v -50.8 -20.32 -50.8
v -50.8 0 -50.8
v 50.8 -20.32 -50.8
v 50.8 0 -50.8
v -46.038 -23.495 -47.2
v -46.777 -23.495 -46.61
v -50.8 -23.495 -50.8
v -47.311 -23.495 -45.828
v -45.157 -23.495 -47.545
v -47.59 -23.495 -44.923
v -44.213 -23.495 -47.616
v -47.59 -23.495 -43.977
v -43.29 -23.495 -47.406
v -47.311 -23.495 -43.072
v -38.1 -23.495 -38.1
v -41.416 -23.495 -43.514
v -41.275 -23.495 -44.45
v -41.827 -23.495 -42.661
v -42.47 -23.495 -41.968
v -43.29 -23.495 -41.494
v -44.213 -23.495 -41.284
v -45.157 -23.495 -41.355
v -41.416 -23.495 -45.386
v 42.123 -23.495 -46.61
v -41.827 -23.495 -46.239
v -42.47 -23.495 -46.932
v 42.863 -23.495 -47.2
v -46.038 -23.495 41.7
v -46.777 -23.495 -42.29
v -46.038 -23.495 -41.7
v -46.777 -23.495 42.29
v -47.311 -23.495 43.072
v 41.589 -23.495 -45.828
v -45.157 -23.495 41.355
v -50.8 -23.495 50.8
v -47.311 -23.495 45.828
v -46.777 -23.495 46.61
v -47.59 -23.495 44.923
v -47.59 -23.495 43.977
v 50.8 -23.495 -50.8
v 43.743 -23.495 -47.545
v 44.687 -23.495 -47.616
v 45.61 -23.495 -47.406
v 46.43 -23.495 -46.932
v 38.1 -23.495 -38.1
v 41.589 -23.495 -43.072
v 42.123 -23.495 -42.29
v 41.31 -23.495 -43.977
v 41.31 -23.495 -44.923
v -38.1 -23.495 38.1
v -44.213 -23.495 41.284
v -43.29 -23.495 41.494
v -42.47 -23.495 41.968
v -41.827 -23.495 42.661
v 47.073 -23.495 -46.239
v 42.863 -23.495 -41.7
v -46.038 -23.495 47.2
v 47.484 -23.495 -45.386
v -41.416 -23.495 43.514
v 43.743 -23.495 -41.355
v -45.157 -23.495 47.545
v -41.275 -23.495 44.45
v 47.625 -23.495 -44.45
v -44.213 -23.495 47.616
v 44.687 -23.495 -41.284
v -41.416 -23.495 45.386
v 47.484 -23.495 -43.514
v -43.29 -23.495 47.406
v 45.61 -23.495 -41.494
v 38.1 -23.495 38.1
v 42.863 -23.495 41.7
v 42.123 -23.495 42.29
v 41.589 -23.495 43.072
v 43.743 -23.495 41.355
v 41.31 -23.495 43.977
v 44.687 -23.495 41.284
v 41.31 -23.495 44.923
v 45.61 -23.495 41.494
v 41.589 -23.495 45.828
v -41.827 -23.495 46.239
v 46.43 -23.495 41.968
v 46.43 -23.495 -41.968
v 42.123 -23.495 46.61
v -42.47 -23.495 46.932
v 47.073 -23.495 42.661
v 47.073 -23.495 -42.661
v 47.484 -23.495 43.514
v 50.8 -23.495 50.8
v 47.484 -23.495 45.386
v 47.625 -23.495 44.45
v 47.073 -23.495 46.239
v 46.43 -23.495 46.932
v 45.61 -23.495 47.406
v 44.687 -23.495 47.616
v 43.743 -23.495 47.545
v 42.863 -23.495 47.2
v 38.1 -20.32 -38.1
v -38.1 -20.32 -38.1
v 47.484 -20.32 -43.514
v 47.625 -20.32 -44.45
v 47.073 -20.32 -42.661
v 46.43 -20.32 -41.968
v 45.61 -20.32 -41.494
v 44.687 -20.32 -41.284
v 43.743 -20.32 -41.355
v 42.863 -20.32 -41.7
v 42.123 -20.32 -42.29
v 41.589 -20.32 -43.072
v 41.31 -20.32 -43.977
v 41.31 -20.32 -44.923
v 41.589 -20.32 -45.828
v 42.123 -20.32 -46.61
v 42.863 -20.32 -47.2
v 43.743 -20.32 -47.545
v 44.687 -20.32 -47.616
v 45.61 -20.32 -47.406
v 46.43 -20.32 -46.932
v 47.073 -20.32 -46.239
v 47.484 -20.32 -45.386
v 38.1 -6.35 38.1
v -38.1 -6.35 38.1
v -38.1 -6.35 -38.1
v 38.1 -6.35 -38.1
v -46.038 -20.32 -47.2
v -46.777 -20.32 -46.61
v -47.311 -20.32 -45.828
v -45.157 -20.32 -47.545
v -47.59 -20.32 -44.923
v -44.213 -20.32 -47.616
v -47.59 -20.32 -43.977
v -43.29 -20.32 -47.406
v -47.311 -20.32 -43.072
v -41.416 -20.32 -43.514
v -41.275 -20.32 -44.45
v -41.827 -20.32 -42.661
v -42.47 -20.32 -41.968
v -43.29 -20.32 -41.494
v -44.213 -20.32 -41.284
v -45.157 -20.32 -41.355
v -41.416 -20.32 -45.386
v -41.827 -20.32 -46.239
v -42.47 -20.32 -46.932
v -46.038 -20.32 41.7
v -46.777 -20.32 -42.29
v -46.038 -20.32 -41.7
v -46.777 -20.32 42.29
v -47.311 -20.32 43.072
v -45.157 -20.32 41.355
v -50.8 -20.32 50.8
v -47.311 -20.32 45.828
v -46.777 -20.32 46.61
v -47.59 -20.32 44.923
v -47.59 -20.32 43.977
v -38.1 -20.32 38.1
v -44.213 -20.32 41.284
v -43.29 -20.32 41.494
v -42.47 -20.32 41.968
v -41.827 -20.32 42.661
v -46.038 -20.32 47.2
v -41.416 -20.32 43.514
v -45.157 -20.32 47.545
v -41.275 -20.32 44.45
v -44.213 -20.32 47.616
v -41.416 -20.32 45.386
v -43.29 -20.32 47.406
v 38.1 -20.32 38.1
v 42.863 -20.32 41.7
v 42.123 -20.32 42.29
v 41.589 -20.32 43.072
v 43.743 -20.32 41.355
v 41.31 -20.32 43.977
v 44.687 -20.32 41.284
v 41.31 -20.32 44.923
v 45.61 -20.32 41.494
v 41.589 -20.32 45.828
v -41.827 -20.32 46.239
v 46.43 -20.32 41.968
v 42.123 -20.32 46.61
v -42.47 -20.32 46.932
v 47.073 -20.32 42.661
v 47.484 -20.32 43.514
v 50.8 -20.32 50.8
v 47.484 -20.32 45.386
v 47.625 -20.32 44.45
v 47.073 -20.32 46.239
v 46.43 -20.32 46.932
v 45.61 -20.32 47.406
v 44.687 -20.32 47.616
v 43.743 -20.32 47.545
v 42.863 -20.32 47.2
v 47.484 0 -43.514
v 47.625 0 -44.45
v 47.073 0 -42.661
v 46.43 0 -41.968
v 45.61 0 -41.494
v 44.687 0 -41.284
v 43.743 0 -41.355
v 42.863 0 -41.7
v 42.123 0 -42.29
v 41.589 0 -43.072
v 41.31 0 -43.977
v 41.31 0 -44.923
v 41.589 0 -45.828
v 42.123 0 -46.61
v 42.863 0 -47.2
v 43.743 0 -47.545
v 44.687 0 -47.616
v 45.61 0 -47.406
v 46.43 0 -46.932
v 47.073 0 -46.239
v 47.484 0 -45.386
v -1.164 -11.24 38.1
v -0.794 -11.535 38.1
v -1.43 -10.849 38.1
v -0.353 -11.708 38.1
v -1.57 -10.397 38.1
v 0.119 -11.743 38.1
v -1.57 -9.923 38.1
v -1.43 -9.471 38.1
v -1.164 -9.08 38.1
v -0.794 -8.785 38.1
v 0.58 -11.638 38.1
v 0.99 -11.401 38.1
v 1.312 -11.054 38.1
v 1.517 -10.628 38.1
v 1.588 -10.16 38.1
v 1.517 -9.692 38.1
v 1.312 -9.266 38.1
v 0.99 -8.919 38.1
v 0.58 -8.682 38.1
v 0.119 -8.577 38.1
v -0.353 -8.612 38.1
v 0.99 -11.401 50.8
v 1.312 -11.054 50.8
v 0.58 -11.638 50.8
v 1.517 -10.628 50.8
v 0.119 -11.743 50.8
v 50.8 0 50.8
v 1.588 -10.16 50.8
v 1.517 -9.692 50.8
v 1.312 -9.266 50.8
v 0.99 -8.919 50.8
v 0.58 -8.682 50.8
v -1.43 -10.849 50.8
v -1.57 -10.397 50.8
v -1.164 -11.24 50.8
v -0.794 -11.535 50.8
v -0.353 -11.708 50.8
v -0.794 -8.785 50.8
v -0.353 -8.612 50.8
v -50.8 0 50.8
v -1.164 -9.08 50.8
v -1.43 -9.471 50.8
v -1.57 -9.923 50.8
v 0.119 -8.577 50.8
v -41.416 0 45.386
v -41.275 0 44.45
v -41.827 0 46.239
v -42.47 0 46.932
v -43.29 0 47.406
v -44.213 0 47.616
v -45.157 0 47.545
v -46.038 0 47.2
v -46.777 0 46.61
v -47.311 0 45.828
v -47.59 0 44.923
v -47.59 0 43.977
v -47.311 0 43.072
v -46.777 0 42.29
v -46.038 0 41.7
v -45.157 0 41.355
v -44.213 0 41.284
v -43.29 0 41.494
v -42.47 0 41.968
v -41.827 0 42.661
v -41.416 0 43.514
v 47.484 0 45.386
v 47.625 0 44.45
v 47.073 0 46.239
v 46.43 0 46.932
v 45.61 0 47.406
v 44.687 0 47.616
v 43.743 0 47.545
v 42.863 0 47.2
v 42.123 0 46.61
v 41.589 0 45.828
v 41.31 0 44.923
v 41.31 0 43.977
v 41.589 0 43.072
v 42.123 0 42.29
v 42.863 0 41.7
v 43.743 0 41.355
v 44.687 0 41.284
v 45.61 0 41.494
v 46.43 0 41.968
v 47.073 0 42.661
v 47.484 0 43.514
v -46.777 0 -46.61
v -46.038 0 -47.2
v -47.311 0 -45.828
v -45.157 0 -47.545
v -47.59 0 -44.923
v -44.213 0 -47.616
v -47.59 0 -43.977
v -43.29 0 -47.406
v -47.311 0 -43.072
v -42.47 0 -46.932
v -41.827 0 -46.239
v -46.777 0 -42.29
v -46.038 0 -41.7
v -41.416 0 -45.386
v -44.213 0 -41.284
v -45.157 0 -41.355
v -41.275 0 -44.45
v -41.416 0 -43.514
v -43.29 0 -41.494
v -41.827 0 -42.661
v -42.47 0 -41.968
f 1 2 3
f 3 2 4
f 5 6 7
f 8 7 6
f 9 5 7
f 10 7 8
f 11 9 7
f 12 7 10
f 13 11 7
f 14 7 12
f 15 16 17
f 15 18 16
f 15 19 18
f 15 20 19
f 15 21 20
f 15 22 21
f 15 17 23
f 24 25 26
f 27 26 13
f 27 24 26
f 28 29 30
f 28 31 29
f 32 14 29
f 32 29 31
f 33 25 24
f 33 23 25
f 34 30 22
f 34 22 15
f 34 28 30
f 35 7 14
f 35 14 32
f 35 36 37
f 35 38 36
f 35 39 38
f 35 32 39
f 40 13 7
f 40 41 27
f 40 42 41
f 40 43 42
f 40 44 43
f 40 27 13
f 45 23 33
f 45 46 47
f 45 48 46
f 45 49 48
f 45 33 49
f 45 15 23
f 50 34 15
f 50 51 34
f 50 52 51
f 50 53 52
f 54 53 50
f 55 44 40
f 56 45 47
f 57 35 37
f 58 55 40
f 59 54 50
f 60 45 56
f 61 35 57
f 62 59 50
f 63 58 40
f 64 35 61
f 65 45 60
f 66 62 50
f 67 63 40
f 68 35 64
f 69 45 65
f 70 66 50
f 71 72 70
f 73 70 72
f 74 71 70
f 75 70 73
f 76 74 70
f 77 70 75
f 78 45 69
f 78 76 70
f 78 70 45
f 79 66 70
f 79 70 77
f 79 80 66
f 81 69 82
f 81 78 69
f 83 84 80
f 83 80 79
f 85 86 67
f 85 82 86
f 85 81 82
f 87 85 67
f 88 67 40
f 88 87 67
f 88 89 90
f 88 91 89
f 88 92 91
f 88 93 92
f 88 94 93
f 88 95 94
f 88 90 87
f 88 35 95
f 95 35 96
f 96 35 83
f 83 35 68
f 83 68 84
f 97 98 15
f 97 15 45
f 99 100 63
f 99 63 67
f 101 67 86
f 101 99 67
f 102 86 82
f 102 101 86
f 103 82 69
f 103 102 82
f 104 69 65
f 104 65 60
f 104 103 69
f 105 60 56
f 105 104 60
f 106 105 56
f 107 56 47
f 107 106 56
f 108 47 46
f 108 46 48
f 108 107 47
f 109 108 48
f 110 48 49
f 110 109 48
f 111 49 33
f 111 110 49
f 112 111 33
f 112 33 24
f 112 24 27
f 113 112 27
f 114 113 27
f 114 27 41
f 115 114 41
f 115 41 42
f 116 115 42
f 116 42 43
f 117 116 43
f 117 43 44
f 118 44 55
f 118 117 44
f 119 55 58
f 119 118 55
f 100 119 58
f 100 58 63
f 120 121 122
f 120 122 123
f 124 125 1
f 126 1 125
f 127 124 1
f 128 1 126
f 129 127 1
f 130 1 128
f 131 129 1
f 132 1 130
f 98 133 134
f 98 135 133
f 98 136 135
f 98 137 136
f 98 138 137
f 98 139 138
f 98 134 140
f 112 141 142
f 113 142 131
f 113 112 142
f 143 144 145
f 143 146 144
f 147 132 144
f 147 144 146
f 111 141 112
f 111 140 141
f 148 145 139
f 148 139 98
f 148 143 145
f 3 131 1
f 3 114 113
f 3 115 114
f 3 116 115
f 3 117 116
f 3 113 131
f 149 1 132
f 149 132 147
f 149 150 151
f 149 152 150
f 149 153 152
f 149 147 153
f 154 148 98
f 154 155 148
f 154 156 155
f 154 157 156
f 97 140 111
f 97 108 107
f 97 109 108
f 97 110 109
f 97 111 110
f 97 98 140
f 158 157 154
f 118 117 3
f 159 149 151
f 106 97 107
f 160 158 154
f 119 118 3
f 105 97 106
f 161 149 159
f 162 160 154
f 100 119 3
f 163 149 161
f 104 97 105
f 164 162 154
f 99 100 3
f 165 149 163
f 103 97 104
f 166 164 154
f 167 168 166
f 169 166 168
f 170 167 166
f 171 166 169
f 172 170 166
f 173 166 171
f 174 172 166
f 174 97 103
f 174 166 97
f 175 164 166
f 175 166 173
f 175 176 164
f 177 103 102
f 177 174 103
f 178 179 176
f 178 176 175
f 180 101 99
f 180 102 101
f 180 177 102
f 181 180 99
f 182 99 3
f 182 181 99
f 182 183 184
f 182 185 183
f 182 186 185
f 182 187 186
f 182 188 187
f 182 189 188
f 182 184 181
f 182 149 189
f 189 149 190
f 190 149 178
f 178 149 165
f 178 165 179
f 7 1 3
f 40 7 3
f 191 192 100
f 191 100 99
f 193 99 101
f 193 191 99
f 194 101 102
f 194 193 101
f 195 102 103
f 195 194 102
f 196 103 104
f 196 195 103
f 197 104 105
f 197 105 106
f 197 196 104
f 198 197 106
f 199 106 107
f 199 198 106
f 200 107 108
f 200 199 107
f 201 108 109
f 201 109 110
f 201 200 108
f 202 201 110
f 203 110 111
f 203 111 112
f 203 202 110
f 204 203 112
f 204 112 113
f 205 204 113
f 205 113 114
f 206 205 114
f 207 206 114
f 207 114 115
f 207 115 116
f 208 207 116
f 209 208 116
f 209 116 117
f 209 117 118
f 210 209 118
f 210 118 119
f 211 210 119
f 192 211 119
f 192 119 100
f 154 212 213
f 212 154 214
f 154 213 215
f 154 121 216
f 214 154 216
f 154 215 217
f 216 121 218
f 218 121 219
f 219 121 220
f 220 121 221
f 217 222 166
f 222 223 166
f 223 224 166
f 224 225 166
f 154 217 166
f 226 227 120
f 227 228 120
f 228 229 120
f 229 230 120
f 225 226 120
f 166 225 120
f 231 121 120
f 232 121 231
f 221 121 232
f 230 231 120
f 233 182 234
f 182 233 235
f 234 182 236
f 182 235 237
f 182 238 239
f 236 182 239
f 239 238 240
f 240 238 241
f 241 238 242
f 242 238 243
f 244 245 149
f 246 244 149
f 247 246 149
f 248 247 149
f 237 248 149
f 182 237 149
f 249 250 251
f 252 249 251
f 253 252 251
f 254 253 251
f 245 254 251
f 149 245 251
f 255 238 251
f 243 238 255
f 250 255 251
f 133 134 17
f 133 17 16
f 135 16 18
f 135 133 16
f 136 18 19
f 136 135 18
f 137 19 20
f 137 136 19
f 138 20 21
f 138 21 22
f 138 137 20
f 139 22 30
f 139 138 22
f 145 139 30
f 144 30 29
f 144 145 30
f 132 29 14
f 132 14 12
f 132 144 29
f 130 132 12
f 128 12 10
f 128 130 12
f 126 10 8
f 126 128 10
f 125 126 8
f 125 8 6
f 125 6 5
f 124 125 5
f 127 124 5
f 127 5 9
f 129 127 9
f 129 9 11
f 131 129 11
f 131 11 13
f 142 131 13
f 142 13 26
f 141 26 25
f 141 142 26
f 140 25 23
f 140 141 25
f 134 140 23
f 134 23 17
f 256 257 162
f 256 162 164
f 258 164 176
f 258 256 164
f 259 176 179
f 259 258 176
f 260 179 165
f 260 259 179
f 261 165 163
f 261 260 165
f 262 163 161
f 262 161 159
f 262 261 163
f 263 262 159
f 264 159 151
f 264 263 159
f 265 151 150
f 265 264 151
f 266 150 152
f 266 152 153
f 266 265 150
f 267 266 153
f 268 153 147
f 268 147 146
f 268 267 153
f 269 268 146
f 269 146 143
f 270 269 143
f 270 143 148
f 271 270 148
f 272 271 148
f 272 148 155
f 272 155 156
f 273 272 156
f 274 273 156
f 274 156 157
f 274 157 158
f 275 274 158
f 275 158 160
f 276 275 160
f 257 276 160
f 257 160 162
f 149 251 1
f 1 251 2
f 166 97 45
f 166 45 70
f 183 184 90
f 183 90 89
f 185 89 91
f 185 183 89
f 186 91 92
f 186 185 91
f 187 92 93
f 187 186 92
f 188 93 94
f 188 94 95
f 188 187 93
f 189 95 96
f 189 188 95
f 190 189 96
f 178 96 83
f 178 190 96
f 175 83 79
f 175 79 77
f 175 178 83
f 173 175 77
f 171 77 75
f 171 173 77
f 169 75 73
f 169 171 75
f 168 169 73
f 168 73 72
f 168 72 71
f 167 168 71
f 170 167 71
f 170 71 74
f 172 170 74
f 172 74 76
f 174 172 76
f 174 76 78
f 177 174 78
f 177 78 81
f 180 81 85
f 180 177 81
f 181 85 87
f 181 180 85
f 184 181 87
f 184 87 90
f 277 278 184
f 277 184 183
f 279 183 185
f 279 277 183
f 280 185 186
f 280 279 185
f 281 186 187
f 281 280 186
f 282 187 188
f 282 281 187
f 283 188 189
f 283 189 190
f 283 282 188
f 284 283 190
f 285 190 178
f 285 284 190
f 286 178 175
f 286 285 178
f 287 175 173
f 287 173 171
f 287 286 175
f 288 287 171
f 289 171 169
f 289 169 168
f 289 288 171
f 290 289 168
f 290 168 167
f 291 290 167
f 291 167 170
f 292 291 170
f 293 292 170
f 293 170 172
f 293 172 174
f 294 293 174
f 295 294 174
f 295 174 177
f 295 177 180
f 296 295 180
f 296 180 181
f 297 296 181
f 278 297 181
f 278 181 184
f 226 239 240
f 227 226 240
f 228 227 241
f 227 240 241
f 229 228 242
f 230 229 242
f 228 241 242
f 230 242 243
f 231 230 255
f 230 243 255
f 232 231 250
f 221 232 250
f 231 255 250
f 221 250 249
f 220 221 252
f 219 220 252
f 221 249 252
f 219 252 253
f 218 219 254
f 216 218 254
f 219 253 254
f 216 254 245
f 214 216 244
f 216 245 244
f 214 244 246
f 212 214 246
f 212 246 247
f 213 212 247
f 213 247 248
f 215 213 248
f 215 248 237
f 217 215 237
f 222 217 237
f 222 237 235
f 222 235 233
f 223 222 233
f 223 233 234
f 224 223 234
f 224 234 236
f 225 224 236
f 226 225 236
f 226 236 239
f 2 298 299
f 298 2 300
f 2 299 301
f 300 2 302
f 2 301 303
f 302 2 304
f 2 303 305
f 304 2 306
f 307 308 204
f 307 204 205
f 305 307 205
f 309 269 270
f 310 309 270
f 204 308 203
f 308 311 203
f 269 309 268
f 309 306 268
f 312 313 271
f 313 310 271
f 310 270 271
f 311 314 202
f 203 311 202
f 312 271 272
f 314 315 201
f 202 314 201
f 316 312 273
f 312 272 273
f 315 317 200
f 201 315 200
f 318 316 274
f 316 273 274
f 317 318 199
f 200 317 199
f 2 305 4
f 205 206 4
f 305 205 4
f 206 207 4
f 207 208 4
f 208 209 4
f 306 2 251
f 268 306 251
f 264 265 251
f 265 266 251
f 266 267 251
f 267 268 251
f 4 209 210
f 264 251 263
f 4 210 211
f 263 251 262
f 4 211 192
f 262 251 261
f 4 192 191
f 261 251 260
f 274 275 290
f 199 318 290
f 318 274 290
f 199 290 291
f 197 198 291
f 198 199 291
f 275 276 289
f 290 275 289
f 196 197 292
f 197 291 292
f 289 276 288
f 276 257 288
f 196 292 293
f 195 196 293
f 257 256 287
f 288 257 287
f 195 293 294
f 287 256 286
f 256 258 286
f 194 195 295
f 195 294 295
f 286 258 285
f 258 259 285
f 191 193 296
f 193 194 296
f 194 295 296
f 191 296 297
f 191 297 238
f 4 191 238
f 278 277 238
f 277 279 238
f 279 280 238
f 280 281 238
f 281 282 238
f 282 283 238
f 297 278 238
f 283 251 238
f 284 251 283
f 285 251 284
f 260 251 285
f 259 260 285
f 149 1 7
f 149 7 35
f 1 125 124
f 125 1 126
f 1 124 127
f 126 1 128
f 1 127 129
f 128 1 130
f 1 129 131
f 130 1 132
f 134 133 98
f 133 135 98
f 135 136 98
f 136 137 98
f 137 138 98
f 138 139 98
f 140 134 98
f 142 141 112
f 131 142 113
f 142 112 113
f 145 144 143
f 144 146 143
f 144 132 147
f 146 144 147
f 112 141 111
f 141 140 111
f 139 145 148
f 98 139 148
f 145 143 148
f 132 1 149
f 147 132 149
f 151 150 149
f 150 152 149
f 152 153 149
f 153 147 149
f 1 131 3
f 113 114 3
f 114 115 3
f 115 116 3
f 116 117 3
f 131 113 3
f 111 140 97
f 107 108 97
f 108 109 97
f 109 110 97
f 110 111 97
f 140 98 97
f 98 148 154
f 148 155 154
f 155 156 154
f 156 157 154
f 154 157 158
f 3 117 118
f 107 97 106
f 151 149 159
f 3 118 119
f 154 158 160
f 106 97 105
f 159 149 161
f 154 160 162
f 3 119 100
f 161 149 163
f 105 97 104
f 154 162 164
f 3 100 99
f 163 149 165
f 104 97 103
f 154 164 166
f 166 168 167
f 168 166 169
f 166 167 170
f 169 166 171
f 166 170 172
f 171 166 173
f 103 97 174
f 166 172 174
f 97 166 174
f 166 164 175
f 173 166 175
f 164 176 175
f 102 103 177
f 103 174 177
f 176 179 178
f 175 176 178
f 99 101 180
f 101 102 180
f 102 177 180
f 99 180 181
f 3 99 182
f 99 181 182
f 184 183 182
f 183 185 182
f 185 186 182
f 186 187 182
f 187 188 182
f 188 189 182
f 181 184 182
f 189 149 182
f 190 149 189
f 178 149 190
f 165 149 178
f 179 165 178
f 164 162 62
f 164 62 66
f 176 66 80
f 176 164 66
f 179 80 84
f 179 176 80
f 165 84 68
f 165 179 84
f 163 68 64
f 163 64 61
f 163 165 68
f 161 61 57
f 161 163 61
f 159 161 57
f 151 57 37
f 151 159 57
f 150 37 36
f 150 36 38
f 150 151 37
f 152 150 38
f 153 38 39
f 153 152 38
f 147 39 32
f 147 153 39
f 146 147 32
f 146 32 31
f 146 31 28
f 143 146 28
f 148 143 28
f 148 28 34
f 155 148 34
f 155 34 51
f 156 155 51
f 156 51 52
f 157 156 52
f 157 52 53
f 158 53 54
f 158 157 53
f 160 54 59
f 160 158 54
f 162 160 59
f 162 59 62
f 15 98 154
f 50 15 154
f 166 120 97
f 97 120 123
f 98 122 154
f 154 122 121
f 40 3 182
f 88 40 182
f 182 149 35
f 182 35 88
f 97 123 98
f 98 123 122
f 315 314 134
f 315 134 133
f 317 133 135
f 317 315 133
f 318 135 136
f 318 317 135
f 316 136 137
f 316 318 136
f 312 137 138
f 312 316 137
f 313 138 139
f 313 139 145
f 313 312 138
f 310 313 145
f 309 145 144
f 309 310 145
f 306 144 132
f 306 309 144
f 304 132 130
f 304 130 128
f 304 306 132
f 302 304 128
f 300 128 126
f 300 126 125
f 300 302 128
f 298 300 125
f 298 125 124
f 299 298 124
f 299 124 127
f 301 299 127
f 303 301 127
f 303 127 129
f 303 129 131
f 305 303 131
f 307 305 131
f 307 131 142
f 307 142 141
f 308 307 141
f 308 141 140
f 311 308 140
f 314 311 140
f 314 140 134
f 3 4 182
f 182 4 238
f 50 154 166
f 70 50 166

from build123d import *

# Parameters (mm, degrees)
F0_R     = 3.175
F0_W     = 12.7
F0_H     = 12.7
F1_DEPTH = 6.35
F2_DEPTH = 20.32
F3_R     = 1.5875
F4_DEPTH = 25.4
F5_W     = 101.6
F5_H     = 101.6
F5_R     = 3.175
F5_W_2   = 76.2
F5_H_2   = 76.2
F6_DEPTH = 3.175


# Not quite as in the source:
# - a feature names something its author has since deleted; it is built from what else it names


with BuildPart() as f1:
    # F0 (on Front) → F1 (new body)
    with BuildSketch(Plane.XZ):
        Polygon((38.1, 38.1), (38.1, 0), (38.1, -38.1), (-38.1, -38.1), (-38.1, 0), (-38.1, 38.1), (-50.8, 38.1), (-50.8, -50.8), (50.8, -50.8), (50.8, 38.1), align=None)
        with Locations((-44.45, -44.45)):
            Circle(F0_R, mode=Mode.SUBTRACT)
        with Locations((44.45, -44.45)):
            Circle(F0_R, mode=Mode.SUBTRACT)
        Polygon((38.1, -38.1), (38.1, 0), (38.1, 38.1), (0, 38.1), (-38.1, 38.1), (-38.1, 0), (-38.1, -38.1), align=None)
        Polygon((0, 38.1), (38.1, 38.1), (38.1, 50.8), (-38.1, 50.8), (-38.1, 38.1), align=None)
        with Locations((-44.45, 44.45)):
            Rectangle(F0_W, F0_H)
        with Locations((-44.45, 44.45)):
            Circle(F0_R, mode=Mode.SUBTRACT)
        with Locations((44.45, 44.45)):
            Rectangle(F0_W, F0_H)
        with Locations((44.45, 44.45)):
            Circle(F0_R, mode=Mode.SUBTRACT)
    extrude(amount=F1_DEPTH)

    # F0 (on Front) → F2 (join)
    with BuildSketch(Plane.XZ):
        Polygon((38.1, 38.1), (38.1, 0), (38.1, -38.1), (-38.1, -38.1), (-38.1, 0), (-38.1, 38.1), (-50.8, 38.1), (-50.8, -50.8), (50.8, -50.8), (50.8, 38.1), align=None)
        with Locations((-44.45, -44.45)):
            Circle(F0_R, mode=Mode.SUBTRACT)
        with Locations((44.45, -44.45)):
            Circle(F0_R, mode=Mode.SUBTRACT)
        Polygon((0, 38.1), (38.1, 38.1), (38.1, 50.8), (-38.1, 50.8), (-38.1, 38.1), align=None)
        with Locations((44.45, 44.45)):
            Rectangle(F0_W, F0_H)
        with Locations((44.45, 44.45)):
            Circle(F0_R, mode=Mode.SUBTRACT)
        with Locations((-44.45, 44.45)):
            Rectangle(F0_W, F0_H)
        with Locations((-44.45, 44.45)):
            Circle(F0_R, mode=Mode.SUBTRACT)
    extrude(amount=F2_DEPTH)

    # F3 (on face) → F4 (cut)
    with BuildSketch(Plane.XY.offset(50.8)):
        with Locations((0, -10.16)):
            Circle(F3_R)
    extrude(amount=-F4_DEPTH, mode=Mode.SUBTRACT)


with BuildPart() as f6:
    # F5 (on face) → F6 (new body)
    with BuildSketch(Plane.XZ.offset(20.32)):
        Rectangle(F5_W, F5_H)
        with Locations((-44.45, -44.45)):
            Circle(F5_R, mode=Mode.SUBTRACT)
        Rectangle(F5_W_2, F5_H_2, mode=Mode.SUBTRACT)
        with Locations((44.45, -44.45)):
            Circle(F5_R, mode=Mode.SUBTRACT)
        with Locations((-44.45, 44.45)):
            Circle(F5_R, mode=Mode.SUBTRACT)
        with Locations((44.45, 44.45)):
            Circle(F5_R, mode=Mode.SUBTRACT)
    extrude(amount=F6_DEPTH)


solid = Compound([f1.part, f6.part])
